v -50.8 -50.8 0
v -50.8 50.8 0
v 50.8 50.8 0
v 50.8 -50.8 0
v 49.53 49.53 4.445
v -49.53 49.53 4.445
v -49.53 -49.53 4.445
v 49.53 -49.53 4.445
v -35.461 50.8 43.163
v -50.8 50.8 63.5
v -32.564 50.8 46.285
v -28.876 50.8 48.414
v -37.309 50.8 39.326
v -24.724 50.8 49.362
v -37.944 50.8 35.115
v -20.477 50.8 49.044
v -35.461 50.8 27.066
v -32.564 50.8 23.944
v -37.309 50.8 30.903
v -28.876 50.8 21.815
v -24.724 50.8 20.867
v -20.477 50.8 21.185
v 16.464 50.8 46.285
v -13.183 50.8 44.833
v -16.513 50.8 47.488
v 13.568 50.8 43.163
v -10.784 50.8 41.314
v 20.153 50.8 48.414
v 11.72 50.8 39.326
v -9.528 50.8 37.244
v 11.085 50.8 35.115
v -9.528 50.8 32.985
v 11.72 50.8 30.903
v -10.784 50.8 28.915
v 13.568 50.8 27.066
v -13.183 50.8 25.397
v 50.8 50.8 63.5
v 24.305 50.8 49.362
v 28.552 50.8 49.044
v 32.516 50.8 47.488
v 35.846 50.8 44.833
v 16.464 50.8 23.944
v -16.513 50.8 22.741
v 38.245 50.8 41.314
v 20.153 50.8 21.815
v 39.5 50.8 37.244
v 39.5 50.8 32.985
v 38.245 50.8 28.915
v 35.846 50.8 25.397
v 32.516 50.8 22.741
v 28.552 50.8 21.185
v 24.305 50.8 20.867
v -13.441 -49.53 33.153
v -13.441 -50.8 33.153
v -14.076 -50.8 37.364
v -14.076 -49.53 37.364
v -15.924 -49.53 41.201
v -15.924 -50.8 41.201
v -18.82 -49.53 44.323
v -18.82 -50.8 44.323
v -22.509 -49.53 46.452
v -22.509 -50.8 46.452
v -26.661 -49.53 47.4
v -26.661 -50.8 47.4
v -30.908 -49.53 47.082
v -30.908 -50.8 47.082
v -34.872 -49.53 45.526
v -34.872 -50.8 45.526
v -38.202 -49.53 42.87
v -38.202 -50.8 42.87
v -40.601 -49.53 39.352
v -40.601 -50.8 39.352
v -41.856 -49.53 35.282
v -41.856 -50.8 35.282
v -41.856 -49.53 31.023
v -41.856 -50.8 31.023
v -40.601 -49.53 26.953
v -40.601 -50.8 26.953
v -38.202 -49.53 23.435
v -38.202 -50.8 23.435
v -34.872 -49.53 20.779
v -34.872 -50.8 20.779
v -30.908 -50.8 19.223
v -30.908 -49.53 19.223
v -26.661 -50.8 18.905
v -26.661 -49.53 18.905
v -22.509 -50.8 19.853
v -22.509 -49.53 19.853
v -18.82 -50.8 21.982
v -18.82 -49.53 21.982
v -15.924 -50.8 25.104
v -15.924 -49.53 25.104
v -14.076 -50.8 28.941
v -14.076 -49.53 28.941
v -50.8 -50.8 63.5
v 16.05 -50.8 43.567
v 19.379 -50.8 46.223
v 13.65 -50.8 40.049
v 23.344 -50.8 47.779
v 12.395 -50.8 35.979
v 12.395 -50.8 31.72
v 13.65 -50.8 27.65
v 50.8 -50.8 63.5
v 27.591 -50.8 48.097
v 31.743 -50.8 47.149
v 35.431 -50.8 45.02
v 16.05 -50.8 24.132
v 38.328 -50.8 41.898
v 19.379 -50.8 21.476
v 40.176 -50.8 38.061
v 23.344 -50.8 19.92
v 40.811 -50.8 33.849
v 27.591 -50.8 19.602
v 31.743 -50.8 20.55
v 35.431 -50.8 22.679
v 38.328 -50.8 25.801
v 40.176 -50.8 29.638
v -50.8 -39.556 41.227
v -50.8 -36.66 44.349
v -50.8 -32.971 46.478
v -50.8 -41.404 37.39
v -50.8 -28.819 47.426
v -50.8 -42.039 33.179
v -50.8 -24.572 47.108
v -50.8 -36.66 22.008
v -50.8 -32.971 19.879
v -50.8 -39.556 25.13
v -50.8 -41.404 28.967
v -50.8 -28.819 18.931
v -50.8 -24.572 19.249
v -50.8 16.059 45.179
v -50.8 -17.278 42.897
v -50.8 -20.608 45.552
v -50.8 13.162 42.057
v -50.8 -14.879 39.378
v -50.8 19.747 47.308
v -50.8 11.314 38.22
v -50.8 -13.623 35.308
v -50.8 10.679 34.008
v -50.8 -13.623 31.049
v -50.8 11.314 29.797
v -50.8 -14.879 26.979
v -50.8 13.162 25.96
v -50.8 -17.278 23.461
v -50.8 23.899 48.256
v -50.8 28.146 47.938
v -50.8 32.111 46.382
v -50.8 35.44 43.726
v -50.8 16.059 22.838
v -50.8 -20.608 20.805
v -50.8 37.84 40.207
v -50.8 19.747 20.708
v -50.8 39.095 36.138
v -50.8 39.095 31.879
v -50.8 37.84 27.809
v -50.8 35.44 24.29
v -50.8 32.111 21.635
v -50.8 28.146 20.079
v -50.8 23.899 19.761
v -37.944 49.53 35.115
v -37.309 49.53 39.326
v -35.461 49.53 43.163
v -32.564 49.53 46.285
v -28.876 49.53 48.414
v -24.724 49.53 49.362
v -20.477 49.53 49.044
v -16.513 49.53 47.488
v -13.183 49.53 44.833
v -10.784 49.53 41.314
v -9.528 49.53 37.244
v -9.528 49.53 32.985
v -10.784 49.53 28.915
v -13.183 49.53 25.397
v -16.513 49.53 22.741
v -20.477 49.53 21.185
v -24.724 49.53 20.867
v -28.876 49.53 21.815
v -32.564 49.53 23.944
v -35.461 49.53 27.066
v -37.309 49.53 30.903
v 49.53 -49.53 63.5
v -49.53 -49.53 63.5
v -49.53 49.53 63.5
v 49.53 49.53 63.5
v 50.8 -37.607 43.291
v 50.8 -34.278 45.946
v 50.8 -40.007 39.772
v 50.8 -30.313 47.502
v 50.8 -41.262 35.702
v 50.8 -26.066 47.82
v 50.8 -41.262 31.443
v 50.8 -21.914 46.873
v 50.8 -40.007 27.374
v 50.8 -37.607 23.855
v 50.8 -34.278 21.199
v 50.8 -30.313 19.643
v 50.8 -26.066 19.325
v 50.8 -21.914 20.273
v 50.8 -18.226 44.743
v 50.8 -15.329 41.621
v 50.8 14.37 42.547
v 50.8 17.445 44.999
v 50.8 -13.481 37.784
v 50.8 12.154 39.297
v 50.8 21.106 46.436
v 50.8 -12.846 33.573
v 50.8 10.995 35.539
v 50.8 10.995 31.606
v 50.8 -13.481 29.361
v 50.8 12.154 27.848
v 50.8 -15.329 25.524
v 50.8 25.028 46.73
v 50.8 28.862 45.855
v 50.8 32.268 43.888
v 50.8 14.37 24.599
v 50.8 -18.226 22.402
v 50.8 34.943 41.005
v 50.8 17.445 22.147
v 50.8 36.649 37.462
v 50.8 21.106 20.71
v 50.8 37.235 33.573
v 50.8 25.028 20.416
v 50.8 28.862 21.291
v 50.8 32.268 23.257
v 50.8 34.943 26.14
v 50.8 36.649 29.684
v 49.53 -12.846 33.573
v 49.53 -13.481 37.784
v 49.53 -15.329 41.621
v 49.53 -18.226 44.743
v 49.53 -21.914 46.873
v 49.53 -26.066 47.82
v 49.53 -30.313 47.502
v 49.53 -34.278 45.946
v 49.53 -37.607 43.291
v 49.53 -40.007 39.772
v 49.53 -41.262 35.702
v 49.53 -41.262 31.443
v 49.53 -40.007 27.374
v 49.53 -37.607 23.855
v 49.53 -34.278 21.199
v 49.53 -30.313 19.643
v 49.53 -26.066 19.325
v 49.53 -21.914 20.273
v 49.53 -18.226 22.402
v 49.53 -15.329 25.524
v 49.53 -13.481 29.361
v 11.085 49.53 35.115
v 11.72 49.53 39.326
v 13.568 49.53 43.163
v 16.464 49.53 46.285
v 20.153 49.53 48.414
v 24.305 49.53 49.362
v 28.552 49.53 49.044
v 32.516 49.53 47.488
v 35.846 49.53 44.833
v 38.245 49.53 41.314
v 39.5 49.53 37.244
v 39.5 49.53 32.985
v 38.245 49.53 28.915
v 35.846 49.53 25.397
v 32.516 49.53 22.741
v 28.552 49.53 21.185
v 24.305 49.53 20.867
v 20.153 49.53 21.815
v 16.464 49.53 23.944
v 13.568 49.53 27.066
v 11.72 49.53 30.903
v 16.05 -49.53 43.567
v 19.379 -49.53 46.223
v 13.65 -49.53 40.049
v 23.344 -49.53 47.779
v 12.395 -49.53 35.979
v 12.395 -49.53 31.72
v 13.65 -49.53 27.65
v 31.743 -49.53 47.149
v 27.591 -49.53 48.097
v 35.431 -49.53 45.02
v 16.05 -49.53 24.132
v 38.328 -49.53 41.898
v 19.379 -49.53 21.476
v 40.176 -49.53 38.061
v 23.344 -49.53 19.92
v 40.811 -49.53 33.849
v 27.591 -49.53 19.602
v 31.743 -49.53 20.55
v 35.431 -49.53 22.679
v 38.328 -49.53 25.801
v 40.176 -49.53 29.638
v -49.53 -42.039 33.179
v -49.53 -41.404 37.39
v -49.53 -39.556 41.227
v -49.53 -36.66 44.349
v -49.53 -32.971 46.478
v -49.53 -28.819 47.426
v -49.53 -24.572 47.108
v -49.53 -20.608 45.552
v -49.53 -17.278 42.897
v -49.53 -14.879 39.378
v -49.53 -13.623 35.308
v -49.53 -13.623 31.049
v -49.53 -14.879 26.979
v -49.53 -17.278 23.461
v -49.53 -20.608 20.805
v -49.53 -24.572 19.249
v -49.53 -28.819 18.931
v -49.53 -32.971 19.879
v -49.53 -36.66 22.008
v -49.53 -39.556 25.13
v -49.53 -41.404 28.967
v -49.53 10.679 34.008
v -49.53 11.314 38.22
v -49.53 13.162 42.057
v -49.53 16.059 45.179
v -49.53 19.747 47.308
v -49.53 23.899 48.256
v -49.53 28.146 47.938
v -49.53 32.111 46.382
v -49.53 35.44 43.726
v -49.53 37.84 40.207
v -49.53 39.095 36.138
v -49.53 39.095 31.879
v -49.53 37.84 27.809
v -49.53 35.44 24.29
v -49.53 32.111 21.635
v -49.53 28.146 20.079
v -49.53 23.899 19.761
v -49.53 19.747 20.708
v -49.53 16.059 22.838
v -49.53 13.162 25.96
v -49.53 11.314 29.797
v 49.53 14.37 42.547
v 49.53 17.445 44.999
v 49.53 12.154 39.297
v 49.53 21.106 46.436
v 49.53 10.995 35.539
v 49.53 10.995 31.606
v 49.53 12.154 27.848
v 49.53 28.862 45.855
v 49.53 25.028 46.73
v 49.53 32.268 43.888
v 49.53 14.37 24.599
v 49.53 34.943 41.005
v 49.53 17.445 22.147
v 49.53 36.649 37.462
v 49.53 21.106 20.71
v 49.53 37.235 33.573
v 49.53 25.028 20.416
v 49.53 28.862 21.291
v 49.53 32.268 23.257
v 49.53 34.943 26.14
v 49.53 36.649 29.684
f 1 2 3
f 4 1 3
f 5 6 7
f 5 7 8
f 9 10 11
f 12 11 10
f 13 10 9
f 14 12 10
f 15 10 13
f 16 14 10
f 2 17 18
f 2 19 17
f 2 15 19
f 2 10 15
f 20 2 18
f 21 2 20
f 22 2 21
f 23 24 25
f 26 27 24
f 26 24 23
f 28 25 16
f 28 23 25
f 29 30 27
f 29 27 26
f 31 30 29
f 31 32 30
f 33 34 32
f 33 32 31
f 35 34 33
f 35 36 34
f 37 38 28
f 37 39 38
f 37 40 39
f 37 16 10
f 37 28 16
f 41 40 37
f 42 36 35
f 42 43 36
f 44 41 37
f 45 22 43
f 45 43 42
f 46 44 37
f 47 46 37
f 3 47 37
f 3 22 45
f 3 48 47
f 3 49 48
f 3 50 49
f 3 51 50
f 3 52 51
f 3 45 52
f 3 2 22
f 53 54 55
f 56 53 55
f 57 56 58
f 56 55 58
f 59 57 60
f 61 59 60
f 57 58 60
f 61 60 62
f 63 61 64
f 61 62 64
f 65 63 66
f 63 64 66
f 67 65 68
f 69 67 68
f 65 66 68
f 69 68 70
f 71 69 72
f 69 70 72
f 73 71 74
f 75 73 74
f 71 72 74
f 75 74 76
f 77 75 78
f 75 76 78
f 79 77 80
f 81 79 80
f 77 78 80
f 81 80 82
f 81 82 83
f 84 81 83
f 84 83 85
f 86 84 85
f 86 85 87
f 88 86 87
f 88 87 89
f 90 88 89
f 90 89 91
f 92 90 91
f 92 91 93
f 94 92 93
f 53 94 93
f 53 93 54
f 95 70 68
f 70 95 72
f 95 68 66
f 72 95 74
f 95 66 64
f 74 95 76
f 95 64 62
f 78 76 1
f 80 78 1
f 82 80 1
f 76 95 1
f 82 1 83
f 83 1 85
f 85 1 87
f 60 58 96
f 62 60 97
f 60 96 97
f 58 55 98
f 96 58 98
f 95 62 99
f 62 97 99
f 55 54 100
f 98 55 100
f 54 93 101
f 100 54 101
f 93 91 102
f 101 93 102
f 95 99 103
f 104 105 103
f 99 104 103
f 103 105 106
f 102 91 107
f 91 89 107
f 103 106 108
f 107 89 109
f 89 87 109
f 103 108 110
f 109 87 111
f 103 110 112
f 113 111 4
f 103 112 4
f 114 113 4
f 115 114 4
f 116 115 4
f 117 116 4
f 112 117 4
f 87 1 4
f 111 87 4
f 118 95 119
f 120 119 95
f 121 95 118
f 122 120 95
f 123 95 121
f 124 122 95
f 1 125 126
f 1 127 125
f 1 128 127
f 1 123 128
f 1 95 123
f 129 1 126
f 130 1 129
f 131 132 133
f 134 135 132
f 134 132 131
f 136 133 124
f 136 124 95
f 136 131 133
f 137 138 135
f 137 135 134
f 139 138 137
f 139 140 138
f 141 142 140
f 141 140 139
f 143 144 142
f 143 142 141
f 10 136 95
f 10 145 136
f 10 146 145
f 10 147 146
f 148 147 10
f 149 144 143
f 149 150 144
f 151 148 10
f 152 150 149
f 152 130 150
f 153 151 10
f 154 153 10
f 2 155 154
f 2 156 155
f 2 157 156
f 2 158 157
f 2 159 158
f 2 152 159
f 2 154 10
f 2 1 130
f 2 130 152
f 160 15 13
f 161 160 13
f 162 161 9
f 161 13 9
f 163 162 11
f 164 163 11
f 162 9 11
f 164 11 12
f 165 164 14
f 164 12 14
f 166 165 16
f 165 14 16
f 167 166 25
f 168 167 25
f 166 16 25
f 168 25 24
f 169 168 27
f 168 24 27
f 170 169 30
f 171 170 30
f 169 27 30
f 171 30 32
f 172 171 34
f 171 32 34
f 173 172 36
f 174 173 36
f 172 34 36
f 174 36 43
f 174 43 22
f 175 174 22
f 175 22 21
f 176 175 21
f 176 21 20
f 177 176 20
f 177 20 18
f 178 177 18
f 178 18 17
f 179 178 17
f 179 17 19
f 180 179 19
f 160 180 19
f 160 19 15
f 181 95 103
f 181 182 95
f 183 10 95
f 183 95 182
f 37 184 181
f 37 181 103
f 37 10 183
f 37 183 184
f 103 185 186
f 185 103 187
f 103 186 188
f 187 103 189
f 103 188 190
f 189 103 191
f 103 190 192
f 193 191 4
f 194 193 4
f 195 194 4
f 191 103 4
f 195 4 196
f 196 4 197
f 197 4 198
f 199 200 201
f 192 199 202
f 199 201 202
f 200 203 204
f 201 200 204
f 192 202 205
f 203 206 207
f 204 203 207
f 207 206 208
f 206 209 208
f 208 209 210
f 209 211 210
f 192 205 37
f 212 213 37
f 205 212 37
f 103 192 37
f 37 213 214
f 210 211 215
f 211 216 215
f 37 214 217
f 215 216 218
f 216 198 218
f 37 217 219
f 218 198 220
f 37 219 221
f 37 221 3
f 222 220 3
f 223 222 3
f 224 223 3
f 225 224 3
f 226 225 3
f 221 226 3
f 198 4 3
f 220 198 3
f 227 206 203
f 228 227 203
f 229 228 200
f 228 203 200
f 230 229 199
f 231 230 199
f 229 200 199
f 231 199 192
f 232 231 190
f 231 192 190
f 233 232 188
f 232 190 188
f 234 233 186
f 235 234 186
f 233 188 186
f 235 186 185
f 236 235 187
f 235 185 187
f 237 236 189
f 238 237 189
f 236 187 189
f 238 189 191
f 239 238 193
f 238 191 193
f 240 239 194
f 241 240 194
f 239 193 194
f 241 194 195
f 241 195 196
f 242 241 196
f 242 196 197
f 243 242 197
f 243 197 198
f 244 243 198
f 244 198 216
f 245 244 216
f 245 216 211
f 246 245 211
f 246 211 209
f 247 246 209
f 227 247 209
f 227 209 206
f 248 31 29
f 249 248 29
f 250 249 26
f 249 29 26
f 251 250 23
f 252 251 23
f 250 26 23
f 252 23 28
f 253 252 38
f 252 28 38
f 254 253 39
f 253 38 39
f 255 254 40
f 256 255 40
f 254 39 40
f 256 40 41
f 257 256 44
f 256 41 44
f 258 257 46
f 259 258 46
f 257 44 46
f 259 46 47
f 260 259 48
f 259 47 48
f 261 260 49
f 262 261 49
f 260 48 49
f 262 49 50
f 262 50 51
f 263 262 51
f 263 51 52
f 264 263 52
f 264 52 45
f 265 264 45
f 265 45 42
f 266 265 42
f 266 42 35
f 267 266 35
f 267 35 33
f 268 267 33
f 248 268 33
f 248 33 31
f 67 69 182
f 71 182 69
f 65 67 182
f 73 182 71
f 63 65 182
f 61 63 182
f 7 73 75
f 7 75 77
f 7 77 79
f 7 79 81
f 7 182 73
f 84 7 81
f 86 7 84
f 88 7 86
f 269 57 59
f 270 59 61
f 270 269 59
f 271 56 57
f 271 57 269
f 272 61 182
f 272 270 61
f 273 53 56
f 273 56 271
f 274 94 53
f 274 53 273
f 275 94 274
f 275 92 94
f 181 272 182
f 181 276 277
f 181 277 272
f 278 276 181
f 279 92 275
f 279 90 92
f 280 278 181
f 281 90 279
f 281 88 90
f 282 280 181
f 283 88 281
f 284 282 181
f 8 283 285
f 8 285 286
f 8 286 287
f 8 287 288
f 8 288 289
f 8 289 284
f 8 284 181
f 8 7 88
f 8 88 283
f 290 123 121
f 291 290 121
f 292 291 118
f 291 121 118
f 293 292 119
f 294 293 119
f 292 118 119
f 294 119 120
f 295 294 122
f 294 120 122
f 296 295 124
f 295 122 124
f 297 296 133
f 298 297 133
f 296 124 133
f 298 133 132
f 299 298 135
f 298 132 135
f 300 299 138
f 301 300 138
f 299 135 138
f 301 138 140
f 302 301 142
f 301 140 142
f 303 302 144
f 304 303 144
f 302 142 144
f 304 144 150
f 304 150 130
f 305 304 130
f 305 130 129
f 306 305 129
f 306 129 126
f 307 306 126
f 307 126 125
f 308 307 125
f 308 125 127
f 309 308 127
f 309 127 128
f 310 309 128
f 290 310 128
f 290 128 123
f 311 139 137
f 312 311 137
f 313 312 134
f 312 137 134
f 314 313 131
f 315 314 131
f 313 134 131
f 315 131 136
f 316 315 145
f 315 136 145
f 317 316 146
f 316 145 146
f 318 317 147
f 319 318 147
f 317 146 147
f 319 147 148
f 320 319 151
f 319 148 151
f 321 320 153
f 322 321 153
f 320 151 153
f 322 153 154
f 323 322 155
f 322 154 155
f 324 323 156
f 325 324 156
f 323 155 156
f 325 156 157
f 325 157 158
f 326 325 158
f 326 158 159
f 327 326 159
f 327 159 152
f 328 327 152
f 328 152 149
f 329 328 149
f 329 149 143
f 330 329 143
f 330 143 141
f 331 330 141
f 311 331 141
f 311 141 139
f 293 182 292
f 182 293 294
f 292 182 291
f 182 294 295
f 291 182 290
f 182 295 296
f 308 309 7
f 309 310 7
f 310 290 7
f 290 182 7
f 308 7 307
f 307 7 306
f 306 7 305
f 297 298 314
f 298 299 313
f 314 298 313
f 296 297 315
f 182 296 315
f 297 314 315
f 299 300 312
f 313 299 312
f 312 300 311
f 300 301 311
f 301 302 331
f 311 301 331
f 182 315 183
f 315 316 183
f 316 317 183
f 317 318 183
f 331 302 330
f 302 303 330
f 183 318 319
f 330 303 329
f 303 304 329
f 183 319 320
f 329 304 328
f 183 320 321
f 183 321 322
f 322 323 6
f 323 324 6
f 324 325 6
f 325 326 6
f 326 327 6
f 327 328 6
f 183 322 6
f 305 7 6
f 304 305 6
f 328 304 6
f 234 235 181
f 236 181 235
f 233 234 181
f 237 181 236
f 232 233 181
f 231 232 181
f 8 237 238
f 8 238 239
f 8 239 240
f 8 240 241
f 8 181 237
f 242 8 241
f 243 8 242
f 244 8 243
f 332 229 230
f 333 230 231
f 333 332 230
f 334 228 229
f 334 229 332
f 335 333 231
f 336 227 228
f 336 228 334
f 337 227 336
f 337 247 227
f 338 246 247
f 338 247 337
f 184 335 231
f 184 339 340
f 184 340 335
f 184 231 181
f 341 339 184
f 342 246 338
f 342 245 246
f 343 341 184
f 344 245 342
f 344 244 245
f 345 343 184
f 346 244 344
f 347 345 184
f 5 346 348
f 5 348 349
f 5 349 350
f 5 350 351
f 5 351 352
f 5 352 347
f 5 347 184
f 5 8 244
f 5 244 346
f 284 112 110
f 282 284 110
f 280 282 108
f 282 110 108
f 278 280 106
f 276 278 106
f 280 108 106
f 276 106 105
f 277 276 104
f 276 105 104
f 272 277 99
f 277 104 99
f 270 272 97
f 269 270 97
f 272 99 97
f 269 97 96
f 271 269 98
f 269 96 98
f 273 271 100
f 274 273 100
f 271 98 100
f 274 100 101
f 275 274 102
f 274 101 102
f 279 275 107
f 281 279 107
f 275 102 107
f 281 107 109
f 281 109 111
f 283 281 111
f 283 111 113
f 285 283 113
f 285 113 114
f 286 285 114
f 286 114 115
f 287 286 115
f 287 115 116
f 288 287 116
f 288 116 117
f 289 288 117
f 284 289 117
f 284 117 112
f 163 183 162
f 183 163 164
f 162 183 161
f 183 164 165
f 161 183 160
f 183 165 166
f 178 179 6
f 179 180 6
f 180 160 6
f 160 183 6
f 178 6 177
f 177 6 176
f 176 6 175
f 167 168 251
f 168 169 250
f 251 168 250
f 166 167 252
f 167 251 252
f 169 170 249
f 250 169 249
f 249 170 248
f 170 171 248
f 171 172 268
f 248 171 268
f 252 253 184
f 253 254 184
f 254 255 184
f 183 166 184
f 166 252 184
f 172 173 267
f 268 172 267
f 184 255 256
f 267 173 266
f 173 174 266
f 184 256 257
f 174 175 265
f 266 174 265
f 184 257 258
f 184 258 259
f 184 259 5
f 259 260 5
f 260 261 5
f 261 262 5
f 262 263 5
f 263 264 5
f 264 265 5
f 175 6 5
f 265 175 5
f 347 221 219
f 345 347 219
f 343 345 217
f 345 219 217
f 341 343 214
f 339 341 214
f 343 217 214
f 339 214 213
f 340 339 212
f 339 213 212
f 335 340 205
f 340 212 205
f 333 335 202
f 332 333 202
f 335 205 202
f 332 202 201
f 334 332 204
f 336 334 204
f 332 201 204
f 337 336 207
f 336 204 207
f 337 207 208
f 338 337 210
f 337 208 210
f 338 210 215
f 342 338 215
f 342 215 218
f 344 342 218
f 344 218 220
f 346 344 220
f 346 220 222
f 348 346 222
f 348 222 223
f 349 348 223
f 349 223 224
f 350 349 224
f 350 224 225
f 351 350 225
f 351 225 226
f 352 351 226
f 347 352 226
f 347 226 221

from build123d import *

# Parameters (mm, degrees)
F0_W      = 99.06
F0_H      = 99.06
F1_DEPTH  = 4.445
F0_W_2    = 101.6
F0_H_2    = 101.6
F2_DEPTH  = 63.5
F5_R      = 14.2875
F7_DEPTH  = 25.4
F3_R      = 14.2875
F3_R_2    = 13.193858
F8_DEPTH  = 25.4
F4_R      = 14.2875
F4_R_2    = 14.425909
F9_DEPTH  = 25.4
F6_R      = 14.2875
F10_DEPTH = 25.4
F11_R     = 14.2875
F12_DEPTH = 25.4


with BuildPart() as f1:
    # F0 (on Top) → F1 (new body)
    with BuildSketch(Plane.XY):
        Rectangle(F0_W, F0_H)
    extrude(amount=F1_DEPTH)

    # F0 (on Top) → F2 (join)
    with BuildSketch(Plane.XY):
        Rectangle(F0_W_2, F0_H_2)
        Rectangle(F0_W, F0_H, mode=Mode.SUBTRACT)
    extrude(amount=F2_DEPTH)

    # F5 (on face) → F7 (cut)
    with BuildSketch(Plane.XZ.offset(50.8)):
        with Locations((-27.728472, 33.152512)):
            Circle(F5_R)
        with Locations((26.523072, 33.849479)):
            Circle(F5_R)
    extrude(amount=-F7_DEPTH, mode=Mode.SUBTRACT)

    # F3 (on face) → F8 (cut)
    with BuildSketch(Plane.YZ.offset(50.8)):
        with Locations((-27.133925, 33.572733)):
            Circle(F3_R)
        with Locations((24.041634, 33.572733)):
            Circle(F3_R_2)
    extrude(amount=-F8_DEPTH, mode=Mode.SUBTRACT)

    # F4 (on face) → F9 (cut)
    with BuildSketch(Plane(origin=(0, 50.8, 0), x_dir=(-1, 0, 0), z_dir=(0, 1, 0))):
        with Locations((-27.319755, 33.915631)):
            Circle(F4_R)
        with Locations((28.376452, 33.915631)):
            Circle(F4_R_2)
    extrude(amount=F9_DEPTH, mode=Mode.SUBTRACT)

    # F6 (on face) → F10 (cut)
    with BuildSketch(Plane(origin=(-50.8, 0, 0), x_dir=(0, -1, 0), z_dir=(-1, 0, 0))):
        with Locations((-24.966941, 34.00825)):
            Circle(F6_R)
        with Locations((27.751417, 33.17856)):
            Circle(F6_R)
    extrude(amount=-F10_DEPTH, mode=Mode.SUBTRACT)

    # F11 (on face) → F12 (cut)
    with BuildSketch(Plane(origin=(0, 50.8, 0), x_dir=(-1, 0, 0), z_dir=(0, 1, 0))):
        with Locations((-25.37245, 35.114542)):
            Circle(F11_R)
        with Locations((23.656343, 35.114542)):
            Circle(F11_R)
    extrude(amount=-F12_DEPTH, mode=Mode.SUBTRACT)


solid = f1.part
